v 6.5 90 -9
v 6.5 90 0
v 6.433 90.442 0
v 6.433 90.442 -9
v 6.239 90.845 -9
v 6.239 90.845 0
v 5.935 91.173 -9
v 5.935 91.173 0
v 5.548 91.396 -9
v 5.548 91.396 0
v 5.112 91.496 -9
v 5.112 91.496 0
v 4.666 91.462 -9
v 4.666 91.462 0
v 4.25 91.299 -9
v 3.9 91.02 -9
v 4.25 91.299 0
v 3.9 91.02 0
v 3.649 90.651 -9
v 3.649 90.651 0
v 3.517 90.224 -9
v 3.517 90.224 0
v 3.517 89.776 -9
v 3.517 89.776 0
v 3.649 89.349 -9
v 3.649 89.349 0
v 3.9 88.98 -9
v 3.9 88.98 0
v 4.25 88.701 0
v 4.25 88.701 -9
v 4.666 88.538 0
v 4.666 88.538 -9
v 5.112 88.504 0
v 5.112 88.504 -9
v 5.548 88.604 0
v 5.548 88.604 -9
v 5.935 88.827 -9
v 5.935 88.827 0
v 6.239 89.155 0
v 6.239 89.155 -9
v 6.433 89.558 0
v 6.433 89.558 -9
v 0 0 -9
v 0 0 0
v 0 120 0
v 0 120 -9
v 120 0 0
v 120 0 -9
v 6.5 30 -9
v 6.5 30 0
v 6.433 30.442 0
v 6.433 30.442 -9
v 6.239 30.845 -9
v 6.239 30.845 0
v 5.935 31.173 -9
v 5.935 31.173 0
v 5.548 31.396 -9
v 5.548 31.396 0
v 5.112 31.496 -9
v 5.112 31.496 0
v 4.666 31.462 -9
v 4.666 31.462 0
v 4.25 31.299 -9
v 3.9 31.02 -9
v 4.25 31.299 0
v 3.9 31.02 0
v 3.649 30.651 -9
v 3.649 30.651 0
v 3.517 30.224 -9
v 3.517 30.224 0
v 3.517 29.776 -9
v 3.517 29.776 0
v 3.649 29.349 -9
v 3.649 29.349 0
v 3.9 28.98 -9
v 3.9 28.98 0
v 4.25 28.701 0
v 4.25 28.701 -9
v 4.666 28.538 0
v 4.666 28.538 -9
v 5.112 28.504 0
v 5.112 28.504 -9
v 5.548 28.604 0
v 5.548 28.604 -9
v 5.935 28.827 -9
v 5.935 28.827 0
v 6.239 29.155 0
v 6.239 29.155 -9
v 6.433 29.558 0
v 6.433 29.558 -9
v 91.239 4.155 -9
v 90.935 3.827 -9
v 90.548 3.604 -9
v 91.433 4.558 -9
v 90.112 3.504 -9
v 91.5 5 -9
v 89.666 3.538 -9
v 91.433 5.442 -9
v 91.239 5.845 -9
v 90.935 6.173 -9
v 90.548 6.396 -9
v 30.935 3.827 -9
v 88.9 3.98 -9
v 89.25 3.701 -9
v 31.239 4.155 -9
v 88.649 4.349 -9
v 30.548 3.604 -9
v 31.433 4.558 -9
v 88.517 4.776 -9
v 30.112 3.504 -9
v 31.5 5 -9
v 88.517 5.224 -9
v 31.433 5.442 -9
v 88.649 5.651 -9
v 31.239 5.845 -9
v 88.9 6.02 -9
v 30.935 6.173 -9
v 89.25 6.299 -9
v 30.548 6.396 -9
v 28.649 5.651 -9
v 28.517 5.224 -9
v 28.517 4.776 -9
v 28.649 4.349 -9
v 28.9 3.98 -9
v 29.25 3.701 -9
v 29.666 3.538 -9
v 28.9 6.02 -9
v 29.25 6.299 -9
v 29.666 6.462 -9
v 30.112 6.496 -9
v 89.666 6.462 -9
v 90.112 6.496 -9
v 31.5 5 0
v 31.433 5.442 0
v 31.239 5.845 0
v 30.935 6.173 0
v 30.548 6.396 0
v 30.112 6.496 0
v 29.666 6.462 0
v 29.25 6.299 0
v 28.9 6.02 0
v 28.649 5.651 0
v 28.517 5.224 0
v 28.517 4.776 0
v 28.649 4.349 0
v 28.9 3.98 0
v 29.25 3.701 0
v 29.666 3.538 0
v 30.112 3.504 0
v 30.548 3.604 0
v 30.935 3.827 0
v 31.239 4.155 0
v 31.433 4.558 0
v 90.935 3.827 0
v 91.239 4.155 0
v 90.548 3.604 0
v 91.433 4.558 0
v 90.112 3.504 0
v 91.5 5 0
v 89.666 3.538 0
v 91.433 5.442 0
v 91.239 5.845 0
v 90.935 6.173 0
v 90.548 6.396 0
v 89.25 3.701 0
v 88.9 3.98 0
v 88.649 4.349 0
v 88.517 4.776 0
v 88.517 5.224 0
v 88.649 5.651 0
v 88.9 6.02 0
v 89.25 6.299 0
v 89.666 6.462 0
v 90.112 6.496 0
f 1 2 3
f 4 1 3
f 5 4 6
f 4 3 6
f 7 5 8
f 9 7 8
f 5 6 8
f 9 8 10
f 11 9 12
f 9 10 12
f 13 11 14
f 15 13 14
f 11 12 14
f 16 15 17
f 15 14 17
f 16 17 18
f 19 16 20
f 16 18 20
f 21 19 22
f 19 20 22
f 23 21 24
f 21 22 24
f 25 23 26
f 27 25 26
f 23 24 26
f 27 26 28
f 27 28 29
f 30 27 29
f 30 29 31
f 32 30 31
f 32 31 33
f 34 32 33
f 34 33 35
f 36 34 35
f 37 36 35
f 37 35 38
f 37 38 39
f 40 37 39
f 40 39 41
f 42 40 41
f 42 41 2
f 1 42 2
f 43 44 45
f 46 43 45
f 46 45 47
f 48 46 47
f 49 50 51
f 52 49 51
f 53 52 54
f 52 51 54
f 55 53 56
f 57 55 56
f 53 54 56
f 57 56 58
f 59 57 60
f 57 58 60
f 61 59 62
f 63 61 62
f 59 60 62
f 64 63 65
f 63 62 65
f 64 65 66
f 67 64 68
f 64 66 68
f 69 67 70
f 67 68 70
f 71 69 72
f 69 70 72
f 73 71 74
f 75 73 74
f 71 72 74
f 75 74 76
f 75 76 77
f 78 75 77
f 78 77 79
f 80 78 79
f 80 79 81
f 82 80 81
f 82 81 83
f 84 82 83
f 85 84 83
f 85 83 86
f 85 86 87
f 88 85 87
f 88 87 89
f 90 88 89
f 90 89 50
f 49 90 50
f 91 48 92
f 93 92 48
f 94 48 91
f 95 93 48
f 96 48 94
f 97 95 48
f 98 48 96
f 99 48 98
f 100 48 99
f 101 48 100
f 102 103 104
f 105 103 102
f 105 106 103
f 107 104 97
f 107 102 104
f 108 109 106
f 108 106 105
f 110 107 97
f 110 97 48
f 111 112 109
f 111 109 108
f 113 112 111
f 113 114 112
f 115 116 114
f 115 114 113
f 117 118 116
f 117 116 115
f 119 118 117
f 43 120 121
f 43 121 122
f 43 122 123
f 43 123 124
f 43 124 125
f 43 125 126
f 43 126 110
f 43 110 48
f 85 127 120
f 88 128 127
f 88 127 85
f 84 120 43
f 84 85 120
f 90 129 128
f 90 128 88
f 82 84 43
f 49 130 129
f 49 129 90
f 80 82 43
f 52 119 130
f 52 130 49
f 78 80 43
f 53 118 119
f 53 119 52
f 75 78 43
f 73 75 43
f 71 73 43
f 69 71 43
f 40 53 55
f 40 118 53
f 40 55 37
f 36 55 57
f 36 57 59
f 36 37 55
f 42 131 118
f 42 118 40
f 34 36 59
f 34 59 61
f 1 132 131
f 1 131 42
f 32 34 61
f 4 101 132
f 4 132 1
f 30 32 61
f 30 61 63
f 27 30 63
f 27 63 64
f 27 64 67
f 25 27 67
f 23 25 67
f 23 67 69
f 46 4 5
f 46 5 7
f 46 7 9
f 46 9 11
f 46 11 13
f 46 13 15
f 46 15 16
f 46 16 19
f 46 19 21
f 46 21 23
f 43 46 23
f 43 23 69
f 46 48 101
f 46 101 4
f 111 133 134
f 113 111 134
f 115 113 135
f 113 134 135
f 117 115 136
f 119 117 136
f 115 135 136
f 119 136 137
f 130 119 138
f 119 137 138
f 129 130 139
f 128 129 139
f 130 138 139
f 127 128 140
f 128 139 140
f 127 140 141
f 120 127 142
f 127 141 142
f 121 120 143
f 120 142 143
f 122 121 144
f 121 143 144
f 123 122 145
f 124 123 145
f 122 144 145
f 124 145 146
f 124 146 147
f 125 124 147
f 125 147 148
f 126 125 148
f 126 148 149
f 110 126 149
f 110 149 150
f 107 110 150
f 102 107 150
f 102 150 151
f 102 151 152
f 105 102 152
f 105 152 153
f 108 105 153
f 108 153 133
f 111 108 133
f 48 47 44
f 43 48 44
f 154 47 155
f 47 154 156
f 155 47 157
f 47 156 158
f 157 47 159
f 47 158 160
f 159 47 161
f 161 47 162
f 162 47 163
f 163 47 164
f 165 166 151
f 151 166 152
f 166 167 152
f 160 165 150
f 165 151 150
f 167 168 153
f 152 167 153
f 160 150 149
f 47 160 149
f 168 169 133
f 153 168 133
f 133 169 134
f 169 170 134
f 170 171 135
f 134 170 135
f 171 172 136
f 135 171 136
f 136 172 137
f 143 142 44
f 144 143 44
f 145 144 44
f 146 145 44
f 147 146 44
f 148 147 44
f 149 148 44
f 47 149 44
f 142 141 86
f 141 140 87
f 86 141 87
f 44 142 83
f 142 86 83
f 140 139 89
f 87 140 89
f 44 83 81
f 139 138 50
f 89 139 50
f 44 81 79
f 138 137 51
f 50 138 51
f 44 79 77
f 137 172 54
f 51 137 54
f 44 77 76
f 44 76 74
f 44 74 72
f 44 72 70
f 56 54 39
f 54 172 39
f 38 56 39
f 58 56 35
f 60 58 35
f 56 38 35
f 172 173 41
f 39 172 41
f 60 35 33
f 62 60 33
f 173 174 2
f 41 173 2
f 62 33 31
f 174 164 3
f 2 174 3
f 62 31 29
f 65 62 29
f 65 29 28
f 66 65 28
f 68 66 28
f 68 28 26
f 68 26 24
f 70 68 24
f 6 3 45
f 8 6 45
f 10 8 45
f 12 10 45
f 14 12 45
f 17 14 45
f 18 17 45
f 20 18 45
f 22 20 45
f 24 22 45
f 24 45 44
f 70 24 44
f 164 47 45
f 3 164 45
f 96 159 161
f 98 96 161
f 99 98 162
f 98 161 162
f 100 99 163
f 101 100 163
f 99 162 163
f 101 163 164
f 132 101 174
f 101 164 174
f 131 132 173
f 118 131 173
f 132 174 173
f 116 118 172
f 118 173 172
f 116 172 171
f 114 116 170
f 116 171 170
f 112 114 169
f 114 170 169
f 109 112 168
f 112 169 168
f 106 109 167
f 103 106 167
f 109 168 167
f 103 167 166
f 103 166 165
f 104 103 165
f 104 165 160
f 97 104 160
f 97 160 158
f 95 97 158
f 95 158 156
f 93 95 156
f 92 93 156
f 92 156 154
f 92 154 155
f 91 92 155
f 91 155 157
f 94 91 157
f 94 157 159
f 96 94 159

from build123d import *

# Parameters (mm, degrees)
PAD_DEPTH    = 9
SKETCH001_R  = 1.5
POCKET_DEPTH = 9.001


with BuildPart() as part:
    # Sketch → Pad (new body)
    with BuildSketch(Plane.XY):
        Polygon((0, 0), (0, 120), (120, 0), align=None)
    extrude(amount=-PAD_DEPTH)

    # Sketch001 (on Face4 of Pad) → Pocket (cut, through all)
    with BuildSketch(Plane.XY):
        with Locations((5, 30)):
            Circle(SKETCH001_R)
        with Locations((5, 90)):
            Circle(SKETCH001_R)
        with Locations((30, 5)):
            Circle(SKETCH001_R)
        with Locations((90, 5)):
            Circle(SKETCH001_R)
    extrude(amount=-POCKET_DEPTH, mode=Mode.SUBTRACT)


solid = part.part
